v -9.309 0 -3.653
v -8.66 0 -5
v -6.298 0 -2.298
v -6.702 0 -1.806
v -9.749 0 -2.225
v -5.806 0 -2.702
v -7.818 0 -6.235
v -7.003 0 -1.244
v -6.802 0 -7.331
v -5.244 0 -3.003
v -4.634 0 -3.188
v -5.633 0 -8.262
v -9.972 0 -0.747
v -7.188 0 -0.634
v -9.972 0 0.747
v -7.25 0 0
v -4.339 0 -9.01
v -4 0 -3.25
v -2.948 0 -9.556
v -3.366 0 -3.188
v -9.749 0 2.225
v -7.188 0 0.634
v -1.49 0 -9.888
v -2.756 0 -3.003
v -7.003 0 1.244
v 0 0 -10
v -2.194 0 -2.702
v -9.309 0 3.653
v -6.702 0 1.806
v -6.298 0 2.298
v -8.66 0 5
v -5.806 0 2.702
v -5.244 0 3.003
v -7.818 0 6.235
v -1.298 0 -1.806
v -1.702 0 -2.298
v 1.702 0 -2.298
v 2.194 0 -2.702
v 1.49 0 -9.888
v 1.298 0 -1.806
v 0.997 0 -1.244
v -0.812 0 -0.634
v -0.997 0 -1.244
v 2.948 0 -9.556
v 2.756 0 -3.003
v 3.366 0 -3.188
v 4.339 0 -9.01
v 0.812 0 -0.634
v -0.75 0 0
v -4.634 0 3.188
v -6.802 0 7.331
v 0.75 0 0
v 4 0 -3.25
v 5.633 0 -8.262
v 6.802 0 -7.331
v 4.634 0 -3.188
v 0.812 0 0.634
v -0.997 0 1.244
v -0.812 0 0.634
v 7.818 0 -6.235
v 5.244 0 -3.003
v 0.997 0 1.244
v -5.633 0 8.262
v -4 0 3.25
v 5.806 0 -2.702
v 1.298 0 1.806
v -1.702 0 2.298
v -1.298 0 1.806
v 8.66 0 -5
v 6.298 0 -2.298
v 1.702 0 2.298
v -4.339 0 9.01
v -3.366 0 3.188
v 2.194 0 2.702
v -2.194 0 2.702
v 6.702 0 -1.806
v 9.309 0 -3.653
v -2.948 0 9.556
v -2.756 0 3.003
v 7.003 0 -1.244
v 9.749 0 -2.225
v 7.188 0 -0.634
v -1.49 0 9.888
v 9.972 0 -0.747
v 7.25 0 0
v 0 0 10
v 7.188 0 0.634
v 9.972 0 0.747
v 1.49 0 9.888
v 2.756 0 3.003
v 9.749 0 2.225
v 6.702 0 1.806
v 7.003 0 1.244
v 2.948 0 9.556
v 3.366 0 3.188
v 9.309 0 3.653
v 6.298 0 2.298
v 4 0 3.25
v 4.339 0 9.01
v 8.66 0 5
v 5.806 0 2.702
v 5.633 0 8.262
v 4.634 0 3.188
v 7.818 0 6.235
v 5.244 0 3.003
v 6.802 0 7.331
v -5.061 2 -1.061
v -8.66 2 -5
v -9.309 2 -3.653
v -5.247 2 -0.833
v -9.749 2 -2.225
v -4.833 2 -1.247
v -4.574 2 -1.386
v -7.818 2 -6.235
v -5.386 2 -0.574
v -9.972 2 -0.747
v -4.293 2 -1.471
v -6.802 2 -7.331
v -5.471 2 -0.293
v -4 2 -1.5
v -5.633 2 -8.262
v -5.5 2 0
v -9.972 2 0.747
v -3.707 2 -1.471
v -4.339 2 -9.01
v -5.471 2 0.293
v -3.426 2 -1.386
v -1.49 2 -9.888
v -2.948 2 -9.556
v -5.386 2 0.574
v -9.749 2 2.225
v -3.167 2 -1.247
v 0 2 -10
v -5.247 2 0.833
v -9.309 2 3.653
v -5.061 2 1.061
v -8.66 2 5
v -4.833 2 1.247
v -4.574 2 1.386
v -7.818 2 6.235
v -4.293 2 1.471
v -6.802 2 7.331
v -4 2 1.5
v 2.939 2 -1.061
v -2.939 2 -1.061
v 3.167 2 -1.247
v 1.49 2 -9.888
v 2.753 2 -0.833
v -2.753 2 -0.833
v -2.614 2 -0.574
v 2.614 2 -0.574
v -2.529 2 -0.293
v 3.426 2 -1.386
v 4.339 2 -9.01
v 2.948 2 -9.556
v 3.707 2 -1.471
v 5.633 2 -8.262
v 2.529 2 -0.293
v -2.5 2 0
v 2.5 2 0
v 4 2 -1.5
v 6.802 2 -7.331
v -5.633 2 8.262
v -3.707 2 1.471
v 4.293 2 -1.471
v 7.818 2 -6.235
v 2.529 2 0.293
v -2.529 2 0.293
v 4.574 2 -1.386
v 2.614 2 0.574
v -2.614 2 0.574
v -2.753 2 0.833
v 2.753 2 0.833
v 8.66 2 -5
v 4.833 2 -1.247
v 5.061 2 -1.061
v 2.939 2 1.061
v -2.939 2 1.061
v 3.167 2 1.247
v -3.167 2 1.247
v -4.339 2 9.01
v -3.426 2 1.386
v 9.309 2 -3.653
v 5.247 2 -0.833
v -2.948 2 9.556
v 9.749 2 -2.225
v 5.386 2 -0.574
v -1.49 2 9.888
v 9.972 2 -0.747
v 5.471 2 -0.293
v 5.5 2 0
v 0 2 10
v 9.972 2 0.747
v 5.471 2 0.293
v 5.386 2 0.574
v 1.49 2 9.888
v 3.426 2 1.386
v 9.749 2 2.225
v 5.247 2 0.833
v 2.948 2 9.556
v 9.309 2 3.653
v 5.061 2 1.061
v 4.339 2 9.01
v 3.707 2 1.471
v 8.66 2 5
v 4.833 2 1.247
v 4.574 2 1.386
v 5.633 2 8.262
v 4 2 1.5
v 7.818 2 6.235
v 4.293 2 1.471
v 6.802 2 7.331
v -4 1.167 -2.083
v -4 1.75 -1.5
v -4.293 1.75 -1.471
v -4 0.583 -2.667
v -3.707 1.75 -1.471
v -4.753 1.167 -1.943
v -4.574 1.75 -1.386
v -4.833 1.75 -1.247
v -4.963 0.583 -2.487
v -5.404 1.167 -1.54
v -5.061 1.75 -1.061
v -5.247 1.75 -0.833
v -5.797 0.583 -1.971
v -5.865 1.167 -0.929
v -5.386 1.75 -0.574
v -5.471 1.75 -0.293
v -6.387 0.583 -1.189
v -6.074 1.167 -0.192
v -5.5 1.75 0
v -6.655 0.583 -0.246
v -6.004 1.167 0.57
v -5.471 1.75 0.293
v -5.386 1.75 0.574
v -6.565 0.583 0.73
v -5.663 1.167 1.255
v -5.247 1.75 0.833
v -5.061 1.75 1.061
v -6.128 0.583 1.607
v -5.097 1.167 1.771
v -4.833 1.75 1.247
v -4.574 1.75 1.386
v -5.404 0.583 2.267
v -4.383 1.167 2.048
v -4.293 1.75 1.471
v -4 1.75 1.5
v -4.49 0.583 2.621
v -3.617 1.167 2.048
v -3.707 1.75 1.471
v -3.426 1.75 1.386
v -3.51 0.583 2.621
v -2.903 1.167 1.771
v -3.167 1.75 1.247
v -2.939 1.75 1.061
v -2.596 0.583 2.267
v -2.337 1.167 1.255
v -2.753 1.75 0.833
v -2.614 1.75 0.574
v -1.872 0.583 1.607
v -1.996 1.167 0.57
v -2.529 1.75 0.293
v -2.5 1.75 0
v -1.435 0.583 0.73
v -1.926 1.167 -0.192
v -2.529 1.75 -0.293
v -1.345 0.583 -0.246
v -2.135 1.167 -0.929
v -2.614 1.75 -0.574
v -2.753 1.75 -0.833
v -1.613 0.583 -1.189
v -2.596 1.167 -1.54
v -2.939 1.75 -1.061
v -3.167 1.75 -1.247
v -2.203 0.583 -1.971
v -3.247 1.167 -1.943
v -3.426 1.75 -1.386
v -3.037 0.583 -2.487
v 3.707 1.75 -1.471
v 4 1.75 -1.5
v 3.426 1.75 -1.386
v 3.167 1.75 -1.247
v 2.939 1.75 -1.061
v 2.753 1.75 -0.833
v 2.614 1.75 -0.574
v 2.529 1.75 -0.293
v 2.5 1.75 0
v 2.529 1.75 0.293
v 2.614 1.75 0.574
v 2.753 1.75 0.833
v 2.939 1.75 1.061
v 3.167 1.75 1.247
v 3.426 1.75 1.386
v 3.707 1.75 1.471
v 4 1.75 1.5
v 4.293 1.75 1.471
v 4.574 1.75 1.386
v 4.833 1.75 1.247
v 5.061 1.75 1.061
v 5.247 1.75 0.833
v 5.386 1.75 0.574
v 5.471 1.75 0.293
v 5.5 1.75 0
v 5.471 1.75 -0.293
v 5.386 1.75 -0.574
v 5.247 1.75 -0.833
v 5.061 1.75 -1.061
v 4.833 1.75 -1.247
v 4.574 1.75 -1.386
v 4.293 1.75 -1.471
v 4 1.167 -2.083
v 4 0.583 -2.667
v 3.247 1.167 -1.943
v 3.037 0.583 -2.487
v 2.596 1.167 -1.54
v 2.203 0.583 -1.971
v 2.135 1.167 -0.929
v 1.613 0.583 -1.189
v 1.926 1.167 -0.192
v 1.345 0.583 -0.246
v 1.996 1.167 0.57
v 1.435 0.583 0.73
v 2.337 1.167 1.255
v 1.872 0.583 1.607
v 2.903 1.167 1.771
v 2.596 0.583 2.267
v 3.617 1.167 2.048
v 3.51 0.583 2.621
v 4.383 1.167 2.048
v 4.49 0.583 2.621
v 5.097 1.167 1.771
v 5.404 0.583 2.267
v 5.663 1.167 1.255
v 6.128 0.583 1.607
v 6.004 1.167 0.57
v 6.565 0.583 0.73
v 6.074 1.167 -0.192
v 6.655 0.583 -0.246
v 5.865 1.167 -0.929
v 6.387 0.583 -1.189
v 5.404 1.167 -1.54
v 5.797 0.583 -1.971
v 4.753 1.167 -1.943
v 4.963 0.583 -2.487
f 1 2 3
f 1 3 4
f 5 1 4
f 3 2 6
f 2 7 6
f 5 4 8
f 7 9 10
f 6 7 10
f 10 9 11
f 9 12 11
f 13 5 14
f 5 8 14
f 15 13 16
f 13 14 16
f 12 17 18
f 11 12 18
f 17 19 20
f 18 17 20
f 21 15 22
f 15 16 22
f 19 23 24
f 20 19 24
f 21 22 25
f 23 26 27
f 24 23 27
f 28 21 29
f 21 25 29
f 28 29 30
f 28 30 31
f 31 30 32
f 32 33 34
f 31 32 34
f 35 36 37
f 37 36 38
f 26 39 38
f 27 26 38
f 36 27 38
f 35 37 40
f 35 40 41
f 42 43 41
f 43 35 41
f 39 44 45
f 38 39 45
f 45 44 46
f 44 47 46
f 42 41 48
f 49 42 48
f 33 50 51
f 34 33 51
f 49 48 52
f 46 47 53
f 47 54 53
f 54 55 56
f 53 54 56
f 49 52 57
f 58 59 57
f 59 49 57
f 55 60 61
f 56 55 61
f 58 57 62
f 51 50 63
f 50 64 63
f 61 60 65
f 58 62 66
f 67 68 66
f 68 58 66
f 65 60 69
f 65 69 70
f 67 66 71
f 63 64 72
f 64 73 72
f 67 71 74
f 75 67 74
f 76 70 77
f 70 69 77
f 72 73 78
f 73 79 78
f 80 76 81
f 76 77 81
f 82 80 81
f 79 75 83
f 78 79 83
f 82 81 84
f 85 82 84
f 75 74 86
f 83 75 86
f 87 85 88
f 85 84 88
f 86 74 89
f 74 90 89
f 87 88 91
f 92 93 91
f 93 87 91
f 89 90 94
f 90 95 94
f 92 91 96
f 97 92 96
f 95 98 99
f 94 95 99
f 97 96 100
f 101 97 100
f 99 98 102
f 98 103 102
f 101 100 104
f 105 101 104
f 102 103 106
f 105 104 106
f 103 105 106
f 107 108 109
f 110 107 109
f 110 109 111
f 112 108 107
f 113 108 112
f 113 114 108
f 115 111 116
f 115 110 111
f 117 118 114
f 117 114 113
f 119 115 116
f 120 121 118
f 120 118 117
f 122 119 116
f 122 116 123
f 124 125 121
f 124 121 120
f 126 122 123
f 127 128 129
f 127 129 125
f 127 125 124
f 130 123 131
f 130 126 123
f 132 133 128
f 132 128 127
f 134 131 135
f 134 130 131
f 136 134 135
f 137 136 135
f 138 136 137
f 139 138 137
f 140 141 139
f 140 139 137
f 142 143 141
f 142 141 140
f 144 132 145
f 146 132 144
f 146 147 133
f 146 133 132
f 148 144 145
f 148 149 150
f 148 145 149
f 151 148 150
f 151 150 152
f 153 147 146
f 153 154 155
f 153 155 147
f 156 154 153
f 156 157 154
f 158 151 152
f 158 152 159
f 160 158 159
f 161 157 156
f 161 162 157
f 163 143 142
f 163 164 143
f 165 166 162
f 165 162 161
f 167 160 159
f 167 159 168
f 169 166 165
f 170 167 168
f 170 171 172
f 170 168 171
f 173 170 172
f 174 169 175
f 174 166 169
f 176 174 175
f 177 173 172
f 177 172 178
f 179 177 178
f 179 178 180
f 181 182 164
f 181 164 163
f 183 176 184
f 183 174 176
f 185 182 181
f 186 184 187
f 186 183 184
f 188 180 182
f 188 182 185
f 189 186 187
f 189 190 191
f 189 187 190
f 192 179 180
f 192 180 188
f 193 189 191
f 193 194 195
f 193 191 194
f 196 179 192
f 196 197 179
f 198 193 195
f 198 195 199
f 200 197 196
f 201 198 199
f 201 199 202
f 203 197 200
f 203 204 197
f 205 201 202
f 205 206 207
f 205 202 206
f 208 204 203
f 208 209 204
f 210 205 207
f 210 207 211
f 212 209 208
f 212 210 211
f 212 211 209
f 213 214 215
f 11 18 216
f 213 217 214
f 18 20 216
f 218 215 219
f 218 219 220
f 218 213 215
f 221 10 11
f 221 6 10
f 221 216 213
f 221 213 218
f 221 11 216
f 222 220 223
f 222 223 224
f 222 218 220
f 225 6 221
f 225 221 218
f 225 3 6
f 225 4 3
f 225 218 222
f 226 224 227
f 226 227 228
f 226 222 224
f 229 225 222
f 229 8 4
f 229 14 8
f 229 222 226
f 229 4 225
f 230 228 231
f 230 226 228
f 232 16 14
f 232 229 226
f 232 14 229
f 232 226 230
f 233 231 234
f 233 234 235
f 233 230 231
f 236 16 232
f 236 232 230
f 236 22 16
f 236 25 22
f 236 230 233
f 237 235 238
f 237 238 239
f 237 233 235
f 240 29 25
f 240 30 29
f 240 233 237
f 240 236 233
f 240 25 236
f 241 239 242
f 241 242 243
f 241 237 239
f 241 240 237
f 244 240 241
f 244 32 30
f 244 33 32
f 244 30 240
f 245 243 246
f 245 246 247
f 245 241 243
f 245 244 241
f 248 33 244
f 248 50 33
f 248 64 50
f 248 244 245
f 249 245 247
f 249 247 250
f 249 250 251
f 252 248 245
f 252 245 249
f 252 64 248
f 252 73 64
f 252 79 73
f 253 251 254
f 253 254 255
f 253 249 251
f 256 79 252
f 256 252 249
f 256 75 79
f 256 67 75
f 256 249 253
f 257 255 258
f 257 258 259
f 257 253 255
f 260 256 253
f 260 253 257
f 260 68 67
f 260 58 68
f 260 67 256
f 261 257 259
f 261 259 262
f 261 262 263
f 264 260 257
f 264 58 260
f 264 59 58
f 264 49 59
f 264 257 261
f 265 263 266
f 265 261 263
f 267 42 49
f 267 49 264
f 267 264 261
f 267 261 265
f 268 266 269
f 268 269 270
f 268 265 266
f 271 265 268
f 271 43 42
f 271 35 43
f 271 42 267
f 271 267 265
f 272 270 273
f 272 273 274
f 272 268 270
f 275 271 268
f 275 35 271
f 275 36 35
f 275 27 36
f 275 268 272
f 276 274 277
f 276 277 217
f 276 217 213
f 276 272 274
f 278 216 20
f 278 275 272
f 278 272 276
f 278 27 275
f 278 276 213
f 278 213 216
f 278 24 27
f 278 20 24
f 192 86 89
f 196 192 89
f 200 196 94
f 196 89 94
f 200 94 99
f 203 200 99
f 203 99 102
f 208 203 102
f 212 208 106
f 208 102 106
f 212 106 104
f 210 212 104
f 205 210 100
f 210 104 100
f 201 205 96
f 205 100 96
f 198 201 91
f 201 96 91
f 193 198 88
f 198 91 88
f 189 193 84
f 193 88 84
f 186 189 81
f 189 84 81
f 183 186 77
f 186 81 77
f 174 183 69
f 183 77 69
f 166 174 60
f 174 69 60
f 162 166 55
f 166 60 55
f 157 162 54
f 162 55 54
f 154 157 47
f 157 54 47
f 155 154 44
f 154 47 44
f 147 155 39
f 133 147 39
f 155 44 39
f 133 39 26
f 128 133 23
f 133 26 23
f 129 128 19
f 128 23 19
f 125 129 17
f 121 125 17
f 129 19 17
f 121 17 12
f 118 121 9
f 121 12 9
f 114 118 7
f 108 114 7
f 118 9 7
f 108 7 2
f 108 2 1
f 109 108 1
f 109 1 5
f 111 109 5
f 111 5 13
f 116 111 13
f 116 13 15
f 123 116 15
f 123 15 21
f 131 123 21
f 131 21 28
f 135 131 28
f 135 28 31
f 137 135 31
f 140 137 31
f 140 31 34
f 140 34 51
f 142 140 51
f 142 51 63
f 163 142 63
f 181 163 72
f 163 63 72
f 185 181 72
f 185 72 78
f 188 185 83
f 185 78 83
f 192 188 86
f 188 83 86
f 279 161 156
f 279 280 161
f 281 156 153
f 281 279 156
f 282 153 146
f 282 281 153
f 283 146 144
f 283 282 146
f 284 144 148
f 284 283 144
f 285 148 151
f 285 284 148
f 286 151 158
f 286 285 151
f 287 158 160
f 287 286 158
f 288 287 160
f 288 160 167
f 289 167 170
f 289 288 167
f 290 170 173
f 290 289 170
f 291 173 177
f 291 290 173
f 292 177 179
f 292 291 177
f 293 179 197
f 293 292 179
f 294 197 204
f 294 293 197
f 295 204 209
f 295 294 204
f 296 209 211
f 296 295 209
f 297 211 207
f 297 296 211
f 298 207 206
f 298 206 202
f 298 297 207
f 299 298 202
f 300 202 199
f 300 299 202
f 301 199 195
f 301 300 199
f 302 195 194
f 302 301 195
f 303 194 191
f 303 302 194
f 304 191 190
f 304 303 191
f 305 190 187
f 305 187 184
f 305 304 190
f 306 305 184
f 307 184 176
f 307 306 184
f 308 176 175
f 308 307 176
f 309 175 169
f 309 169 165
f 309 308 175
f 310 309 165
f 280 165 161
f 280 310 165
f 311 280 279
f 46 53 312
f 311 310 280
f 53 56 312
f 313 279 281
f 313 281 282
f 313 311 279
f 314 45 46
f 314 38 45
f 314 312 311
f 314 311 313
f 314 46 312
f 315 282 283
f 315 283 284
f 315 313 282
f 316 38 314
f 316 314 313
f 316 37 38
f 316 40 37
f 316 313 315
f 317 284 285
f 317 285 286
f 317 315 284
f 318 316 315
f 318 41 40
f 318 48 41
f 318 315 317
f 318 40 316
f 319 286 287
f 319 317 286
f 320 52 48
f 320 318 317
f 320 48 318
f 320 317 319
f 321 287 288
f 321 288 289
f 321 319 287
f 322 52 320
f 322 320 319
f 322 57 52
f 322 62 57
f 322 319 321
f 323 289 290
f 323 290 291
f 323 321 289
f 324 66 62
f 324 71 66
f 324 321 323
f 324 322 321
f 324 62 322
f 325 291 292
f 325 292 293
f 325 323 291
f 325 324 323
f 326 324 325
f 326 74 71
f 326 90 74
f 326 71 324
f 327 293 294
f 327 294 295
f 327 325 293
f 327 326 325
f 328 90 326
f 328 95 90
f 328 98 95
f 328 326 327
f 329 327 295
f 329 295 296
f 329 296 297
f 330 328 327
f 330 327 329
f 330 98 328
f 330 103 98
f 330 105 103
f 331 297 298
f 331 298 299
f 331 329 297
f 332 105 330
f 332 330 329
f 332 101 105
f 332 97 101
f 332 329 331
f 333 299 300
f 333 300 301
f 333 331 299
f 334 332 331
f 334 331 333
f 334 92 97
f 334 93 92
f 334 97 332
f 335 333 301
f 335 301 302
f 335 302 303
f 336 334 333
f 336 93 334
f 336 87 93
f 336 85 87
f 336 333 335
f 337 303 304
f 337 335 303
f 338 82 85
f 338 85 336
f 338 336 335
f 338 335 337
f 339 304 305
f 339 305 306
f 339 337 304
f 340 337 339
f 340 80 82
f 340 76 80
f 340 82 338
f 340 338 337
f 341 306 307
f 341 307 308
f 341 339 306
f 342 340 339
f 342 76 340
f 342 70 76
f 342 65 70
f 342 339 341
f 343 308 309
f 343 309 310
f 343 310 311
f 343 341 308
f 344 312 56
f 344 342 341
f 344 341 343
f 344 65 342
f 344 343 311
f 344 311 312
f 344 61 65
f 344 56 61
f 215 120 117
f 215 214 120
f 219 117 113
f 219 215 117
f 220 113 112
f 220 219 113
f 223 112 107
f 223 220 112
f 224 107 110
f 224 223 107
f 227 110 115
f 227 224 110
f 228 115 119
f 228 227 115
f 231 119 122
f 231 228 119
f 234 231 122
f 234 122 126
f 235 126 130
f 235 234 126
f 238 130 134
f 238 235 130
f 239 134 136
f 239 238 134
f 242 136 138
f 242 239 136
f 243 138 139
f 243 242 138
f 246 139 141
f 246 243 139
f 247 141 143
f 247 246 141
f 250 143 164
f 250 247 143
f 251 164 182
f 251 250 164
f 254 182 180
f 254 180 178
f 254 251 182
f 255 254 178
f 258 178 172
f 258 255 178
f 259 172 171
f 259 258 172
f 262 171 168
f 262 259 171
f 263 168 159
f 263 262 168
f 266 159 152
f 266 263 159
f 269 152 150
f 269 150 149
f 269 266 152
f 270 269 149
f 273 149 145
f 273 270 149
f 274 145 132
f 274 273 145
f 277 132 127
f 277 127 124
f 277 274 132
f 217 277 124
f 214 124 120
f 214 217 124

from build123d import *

# Parameters (mm, degrees)
SKETCH_1_R               = 10
EXTRUDE_1_DEPTH          = 2
HOLE_WIZARD_2_AT_2_COUNT = 2
HOLE_WIZARD_2_AT_2_PITCH = 8


with BuildPart() as part:
    # 草图1 → 凸台-拉伸1 (new body)
    with BuildSketch(Plane(origin=(0, 0, 0), x_dir=(1, 0, 0), z_dir=(0, 1, 0))):
        with Locations(Location((0, 0, 0), (0, 0, 270))):
            Circle(SKETCH_1_R)
    extrude(amount=EXTRUDE_1_DEPTH)

    # 草图4 → 孔2 (revolve, cut)
    with BuildSketch(Plane(origin=(4, 0, 0), x_dir=(0, 0, -1), z_dir=(1, 0, 0))):
        Polygon((0, 0), (0, 2), (1.5, 2), (1.5, 1.75), (3.25, 0), align=None)
    hole_wizard_2 = revolve(axis=Axis((4, -6.445314094, 0), (0, 1, 0)), mode=Mode.SUBTRACT)

    # 孔2 at 2: 孔2 ×2
    with Locations(*[(-i * HOLE_WIZARD_2_AT_2_PITCH, 0, 0) for i in range(1, HOLE_WIZARD_2_AT_2_COUNT)]):
        add(hole_wizard_2, mode=Mode.SUBTRACT)


solid = part.part
